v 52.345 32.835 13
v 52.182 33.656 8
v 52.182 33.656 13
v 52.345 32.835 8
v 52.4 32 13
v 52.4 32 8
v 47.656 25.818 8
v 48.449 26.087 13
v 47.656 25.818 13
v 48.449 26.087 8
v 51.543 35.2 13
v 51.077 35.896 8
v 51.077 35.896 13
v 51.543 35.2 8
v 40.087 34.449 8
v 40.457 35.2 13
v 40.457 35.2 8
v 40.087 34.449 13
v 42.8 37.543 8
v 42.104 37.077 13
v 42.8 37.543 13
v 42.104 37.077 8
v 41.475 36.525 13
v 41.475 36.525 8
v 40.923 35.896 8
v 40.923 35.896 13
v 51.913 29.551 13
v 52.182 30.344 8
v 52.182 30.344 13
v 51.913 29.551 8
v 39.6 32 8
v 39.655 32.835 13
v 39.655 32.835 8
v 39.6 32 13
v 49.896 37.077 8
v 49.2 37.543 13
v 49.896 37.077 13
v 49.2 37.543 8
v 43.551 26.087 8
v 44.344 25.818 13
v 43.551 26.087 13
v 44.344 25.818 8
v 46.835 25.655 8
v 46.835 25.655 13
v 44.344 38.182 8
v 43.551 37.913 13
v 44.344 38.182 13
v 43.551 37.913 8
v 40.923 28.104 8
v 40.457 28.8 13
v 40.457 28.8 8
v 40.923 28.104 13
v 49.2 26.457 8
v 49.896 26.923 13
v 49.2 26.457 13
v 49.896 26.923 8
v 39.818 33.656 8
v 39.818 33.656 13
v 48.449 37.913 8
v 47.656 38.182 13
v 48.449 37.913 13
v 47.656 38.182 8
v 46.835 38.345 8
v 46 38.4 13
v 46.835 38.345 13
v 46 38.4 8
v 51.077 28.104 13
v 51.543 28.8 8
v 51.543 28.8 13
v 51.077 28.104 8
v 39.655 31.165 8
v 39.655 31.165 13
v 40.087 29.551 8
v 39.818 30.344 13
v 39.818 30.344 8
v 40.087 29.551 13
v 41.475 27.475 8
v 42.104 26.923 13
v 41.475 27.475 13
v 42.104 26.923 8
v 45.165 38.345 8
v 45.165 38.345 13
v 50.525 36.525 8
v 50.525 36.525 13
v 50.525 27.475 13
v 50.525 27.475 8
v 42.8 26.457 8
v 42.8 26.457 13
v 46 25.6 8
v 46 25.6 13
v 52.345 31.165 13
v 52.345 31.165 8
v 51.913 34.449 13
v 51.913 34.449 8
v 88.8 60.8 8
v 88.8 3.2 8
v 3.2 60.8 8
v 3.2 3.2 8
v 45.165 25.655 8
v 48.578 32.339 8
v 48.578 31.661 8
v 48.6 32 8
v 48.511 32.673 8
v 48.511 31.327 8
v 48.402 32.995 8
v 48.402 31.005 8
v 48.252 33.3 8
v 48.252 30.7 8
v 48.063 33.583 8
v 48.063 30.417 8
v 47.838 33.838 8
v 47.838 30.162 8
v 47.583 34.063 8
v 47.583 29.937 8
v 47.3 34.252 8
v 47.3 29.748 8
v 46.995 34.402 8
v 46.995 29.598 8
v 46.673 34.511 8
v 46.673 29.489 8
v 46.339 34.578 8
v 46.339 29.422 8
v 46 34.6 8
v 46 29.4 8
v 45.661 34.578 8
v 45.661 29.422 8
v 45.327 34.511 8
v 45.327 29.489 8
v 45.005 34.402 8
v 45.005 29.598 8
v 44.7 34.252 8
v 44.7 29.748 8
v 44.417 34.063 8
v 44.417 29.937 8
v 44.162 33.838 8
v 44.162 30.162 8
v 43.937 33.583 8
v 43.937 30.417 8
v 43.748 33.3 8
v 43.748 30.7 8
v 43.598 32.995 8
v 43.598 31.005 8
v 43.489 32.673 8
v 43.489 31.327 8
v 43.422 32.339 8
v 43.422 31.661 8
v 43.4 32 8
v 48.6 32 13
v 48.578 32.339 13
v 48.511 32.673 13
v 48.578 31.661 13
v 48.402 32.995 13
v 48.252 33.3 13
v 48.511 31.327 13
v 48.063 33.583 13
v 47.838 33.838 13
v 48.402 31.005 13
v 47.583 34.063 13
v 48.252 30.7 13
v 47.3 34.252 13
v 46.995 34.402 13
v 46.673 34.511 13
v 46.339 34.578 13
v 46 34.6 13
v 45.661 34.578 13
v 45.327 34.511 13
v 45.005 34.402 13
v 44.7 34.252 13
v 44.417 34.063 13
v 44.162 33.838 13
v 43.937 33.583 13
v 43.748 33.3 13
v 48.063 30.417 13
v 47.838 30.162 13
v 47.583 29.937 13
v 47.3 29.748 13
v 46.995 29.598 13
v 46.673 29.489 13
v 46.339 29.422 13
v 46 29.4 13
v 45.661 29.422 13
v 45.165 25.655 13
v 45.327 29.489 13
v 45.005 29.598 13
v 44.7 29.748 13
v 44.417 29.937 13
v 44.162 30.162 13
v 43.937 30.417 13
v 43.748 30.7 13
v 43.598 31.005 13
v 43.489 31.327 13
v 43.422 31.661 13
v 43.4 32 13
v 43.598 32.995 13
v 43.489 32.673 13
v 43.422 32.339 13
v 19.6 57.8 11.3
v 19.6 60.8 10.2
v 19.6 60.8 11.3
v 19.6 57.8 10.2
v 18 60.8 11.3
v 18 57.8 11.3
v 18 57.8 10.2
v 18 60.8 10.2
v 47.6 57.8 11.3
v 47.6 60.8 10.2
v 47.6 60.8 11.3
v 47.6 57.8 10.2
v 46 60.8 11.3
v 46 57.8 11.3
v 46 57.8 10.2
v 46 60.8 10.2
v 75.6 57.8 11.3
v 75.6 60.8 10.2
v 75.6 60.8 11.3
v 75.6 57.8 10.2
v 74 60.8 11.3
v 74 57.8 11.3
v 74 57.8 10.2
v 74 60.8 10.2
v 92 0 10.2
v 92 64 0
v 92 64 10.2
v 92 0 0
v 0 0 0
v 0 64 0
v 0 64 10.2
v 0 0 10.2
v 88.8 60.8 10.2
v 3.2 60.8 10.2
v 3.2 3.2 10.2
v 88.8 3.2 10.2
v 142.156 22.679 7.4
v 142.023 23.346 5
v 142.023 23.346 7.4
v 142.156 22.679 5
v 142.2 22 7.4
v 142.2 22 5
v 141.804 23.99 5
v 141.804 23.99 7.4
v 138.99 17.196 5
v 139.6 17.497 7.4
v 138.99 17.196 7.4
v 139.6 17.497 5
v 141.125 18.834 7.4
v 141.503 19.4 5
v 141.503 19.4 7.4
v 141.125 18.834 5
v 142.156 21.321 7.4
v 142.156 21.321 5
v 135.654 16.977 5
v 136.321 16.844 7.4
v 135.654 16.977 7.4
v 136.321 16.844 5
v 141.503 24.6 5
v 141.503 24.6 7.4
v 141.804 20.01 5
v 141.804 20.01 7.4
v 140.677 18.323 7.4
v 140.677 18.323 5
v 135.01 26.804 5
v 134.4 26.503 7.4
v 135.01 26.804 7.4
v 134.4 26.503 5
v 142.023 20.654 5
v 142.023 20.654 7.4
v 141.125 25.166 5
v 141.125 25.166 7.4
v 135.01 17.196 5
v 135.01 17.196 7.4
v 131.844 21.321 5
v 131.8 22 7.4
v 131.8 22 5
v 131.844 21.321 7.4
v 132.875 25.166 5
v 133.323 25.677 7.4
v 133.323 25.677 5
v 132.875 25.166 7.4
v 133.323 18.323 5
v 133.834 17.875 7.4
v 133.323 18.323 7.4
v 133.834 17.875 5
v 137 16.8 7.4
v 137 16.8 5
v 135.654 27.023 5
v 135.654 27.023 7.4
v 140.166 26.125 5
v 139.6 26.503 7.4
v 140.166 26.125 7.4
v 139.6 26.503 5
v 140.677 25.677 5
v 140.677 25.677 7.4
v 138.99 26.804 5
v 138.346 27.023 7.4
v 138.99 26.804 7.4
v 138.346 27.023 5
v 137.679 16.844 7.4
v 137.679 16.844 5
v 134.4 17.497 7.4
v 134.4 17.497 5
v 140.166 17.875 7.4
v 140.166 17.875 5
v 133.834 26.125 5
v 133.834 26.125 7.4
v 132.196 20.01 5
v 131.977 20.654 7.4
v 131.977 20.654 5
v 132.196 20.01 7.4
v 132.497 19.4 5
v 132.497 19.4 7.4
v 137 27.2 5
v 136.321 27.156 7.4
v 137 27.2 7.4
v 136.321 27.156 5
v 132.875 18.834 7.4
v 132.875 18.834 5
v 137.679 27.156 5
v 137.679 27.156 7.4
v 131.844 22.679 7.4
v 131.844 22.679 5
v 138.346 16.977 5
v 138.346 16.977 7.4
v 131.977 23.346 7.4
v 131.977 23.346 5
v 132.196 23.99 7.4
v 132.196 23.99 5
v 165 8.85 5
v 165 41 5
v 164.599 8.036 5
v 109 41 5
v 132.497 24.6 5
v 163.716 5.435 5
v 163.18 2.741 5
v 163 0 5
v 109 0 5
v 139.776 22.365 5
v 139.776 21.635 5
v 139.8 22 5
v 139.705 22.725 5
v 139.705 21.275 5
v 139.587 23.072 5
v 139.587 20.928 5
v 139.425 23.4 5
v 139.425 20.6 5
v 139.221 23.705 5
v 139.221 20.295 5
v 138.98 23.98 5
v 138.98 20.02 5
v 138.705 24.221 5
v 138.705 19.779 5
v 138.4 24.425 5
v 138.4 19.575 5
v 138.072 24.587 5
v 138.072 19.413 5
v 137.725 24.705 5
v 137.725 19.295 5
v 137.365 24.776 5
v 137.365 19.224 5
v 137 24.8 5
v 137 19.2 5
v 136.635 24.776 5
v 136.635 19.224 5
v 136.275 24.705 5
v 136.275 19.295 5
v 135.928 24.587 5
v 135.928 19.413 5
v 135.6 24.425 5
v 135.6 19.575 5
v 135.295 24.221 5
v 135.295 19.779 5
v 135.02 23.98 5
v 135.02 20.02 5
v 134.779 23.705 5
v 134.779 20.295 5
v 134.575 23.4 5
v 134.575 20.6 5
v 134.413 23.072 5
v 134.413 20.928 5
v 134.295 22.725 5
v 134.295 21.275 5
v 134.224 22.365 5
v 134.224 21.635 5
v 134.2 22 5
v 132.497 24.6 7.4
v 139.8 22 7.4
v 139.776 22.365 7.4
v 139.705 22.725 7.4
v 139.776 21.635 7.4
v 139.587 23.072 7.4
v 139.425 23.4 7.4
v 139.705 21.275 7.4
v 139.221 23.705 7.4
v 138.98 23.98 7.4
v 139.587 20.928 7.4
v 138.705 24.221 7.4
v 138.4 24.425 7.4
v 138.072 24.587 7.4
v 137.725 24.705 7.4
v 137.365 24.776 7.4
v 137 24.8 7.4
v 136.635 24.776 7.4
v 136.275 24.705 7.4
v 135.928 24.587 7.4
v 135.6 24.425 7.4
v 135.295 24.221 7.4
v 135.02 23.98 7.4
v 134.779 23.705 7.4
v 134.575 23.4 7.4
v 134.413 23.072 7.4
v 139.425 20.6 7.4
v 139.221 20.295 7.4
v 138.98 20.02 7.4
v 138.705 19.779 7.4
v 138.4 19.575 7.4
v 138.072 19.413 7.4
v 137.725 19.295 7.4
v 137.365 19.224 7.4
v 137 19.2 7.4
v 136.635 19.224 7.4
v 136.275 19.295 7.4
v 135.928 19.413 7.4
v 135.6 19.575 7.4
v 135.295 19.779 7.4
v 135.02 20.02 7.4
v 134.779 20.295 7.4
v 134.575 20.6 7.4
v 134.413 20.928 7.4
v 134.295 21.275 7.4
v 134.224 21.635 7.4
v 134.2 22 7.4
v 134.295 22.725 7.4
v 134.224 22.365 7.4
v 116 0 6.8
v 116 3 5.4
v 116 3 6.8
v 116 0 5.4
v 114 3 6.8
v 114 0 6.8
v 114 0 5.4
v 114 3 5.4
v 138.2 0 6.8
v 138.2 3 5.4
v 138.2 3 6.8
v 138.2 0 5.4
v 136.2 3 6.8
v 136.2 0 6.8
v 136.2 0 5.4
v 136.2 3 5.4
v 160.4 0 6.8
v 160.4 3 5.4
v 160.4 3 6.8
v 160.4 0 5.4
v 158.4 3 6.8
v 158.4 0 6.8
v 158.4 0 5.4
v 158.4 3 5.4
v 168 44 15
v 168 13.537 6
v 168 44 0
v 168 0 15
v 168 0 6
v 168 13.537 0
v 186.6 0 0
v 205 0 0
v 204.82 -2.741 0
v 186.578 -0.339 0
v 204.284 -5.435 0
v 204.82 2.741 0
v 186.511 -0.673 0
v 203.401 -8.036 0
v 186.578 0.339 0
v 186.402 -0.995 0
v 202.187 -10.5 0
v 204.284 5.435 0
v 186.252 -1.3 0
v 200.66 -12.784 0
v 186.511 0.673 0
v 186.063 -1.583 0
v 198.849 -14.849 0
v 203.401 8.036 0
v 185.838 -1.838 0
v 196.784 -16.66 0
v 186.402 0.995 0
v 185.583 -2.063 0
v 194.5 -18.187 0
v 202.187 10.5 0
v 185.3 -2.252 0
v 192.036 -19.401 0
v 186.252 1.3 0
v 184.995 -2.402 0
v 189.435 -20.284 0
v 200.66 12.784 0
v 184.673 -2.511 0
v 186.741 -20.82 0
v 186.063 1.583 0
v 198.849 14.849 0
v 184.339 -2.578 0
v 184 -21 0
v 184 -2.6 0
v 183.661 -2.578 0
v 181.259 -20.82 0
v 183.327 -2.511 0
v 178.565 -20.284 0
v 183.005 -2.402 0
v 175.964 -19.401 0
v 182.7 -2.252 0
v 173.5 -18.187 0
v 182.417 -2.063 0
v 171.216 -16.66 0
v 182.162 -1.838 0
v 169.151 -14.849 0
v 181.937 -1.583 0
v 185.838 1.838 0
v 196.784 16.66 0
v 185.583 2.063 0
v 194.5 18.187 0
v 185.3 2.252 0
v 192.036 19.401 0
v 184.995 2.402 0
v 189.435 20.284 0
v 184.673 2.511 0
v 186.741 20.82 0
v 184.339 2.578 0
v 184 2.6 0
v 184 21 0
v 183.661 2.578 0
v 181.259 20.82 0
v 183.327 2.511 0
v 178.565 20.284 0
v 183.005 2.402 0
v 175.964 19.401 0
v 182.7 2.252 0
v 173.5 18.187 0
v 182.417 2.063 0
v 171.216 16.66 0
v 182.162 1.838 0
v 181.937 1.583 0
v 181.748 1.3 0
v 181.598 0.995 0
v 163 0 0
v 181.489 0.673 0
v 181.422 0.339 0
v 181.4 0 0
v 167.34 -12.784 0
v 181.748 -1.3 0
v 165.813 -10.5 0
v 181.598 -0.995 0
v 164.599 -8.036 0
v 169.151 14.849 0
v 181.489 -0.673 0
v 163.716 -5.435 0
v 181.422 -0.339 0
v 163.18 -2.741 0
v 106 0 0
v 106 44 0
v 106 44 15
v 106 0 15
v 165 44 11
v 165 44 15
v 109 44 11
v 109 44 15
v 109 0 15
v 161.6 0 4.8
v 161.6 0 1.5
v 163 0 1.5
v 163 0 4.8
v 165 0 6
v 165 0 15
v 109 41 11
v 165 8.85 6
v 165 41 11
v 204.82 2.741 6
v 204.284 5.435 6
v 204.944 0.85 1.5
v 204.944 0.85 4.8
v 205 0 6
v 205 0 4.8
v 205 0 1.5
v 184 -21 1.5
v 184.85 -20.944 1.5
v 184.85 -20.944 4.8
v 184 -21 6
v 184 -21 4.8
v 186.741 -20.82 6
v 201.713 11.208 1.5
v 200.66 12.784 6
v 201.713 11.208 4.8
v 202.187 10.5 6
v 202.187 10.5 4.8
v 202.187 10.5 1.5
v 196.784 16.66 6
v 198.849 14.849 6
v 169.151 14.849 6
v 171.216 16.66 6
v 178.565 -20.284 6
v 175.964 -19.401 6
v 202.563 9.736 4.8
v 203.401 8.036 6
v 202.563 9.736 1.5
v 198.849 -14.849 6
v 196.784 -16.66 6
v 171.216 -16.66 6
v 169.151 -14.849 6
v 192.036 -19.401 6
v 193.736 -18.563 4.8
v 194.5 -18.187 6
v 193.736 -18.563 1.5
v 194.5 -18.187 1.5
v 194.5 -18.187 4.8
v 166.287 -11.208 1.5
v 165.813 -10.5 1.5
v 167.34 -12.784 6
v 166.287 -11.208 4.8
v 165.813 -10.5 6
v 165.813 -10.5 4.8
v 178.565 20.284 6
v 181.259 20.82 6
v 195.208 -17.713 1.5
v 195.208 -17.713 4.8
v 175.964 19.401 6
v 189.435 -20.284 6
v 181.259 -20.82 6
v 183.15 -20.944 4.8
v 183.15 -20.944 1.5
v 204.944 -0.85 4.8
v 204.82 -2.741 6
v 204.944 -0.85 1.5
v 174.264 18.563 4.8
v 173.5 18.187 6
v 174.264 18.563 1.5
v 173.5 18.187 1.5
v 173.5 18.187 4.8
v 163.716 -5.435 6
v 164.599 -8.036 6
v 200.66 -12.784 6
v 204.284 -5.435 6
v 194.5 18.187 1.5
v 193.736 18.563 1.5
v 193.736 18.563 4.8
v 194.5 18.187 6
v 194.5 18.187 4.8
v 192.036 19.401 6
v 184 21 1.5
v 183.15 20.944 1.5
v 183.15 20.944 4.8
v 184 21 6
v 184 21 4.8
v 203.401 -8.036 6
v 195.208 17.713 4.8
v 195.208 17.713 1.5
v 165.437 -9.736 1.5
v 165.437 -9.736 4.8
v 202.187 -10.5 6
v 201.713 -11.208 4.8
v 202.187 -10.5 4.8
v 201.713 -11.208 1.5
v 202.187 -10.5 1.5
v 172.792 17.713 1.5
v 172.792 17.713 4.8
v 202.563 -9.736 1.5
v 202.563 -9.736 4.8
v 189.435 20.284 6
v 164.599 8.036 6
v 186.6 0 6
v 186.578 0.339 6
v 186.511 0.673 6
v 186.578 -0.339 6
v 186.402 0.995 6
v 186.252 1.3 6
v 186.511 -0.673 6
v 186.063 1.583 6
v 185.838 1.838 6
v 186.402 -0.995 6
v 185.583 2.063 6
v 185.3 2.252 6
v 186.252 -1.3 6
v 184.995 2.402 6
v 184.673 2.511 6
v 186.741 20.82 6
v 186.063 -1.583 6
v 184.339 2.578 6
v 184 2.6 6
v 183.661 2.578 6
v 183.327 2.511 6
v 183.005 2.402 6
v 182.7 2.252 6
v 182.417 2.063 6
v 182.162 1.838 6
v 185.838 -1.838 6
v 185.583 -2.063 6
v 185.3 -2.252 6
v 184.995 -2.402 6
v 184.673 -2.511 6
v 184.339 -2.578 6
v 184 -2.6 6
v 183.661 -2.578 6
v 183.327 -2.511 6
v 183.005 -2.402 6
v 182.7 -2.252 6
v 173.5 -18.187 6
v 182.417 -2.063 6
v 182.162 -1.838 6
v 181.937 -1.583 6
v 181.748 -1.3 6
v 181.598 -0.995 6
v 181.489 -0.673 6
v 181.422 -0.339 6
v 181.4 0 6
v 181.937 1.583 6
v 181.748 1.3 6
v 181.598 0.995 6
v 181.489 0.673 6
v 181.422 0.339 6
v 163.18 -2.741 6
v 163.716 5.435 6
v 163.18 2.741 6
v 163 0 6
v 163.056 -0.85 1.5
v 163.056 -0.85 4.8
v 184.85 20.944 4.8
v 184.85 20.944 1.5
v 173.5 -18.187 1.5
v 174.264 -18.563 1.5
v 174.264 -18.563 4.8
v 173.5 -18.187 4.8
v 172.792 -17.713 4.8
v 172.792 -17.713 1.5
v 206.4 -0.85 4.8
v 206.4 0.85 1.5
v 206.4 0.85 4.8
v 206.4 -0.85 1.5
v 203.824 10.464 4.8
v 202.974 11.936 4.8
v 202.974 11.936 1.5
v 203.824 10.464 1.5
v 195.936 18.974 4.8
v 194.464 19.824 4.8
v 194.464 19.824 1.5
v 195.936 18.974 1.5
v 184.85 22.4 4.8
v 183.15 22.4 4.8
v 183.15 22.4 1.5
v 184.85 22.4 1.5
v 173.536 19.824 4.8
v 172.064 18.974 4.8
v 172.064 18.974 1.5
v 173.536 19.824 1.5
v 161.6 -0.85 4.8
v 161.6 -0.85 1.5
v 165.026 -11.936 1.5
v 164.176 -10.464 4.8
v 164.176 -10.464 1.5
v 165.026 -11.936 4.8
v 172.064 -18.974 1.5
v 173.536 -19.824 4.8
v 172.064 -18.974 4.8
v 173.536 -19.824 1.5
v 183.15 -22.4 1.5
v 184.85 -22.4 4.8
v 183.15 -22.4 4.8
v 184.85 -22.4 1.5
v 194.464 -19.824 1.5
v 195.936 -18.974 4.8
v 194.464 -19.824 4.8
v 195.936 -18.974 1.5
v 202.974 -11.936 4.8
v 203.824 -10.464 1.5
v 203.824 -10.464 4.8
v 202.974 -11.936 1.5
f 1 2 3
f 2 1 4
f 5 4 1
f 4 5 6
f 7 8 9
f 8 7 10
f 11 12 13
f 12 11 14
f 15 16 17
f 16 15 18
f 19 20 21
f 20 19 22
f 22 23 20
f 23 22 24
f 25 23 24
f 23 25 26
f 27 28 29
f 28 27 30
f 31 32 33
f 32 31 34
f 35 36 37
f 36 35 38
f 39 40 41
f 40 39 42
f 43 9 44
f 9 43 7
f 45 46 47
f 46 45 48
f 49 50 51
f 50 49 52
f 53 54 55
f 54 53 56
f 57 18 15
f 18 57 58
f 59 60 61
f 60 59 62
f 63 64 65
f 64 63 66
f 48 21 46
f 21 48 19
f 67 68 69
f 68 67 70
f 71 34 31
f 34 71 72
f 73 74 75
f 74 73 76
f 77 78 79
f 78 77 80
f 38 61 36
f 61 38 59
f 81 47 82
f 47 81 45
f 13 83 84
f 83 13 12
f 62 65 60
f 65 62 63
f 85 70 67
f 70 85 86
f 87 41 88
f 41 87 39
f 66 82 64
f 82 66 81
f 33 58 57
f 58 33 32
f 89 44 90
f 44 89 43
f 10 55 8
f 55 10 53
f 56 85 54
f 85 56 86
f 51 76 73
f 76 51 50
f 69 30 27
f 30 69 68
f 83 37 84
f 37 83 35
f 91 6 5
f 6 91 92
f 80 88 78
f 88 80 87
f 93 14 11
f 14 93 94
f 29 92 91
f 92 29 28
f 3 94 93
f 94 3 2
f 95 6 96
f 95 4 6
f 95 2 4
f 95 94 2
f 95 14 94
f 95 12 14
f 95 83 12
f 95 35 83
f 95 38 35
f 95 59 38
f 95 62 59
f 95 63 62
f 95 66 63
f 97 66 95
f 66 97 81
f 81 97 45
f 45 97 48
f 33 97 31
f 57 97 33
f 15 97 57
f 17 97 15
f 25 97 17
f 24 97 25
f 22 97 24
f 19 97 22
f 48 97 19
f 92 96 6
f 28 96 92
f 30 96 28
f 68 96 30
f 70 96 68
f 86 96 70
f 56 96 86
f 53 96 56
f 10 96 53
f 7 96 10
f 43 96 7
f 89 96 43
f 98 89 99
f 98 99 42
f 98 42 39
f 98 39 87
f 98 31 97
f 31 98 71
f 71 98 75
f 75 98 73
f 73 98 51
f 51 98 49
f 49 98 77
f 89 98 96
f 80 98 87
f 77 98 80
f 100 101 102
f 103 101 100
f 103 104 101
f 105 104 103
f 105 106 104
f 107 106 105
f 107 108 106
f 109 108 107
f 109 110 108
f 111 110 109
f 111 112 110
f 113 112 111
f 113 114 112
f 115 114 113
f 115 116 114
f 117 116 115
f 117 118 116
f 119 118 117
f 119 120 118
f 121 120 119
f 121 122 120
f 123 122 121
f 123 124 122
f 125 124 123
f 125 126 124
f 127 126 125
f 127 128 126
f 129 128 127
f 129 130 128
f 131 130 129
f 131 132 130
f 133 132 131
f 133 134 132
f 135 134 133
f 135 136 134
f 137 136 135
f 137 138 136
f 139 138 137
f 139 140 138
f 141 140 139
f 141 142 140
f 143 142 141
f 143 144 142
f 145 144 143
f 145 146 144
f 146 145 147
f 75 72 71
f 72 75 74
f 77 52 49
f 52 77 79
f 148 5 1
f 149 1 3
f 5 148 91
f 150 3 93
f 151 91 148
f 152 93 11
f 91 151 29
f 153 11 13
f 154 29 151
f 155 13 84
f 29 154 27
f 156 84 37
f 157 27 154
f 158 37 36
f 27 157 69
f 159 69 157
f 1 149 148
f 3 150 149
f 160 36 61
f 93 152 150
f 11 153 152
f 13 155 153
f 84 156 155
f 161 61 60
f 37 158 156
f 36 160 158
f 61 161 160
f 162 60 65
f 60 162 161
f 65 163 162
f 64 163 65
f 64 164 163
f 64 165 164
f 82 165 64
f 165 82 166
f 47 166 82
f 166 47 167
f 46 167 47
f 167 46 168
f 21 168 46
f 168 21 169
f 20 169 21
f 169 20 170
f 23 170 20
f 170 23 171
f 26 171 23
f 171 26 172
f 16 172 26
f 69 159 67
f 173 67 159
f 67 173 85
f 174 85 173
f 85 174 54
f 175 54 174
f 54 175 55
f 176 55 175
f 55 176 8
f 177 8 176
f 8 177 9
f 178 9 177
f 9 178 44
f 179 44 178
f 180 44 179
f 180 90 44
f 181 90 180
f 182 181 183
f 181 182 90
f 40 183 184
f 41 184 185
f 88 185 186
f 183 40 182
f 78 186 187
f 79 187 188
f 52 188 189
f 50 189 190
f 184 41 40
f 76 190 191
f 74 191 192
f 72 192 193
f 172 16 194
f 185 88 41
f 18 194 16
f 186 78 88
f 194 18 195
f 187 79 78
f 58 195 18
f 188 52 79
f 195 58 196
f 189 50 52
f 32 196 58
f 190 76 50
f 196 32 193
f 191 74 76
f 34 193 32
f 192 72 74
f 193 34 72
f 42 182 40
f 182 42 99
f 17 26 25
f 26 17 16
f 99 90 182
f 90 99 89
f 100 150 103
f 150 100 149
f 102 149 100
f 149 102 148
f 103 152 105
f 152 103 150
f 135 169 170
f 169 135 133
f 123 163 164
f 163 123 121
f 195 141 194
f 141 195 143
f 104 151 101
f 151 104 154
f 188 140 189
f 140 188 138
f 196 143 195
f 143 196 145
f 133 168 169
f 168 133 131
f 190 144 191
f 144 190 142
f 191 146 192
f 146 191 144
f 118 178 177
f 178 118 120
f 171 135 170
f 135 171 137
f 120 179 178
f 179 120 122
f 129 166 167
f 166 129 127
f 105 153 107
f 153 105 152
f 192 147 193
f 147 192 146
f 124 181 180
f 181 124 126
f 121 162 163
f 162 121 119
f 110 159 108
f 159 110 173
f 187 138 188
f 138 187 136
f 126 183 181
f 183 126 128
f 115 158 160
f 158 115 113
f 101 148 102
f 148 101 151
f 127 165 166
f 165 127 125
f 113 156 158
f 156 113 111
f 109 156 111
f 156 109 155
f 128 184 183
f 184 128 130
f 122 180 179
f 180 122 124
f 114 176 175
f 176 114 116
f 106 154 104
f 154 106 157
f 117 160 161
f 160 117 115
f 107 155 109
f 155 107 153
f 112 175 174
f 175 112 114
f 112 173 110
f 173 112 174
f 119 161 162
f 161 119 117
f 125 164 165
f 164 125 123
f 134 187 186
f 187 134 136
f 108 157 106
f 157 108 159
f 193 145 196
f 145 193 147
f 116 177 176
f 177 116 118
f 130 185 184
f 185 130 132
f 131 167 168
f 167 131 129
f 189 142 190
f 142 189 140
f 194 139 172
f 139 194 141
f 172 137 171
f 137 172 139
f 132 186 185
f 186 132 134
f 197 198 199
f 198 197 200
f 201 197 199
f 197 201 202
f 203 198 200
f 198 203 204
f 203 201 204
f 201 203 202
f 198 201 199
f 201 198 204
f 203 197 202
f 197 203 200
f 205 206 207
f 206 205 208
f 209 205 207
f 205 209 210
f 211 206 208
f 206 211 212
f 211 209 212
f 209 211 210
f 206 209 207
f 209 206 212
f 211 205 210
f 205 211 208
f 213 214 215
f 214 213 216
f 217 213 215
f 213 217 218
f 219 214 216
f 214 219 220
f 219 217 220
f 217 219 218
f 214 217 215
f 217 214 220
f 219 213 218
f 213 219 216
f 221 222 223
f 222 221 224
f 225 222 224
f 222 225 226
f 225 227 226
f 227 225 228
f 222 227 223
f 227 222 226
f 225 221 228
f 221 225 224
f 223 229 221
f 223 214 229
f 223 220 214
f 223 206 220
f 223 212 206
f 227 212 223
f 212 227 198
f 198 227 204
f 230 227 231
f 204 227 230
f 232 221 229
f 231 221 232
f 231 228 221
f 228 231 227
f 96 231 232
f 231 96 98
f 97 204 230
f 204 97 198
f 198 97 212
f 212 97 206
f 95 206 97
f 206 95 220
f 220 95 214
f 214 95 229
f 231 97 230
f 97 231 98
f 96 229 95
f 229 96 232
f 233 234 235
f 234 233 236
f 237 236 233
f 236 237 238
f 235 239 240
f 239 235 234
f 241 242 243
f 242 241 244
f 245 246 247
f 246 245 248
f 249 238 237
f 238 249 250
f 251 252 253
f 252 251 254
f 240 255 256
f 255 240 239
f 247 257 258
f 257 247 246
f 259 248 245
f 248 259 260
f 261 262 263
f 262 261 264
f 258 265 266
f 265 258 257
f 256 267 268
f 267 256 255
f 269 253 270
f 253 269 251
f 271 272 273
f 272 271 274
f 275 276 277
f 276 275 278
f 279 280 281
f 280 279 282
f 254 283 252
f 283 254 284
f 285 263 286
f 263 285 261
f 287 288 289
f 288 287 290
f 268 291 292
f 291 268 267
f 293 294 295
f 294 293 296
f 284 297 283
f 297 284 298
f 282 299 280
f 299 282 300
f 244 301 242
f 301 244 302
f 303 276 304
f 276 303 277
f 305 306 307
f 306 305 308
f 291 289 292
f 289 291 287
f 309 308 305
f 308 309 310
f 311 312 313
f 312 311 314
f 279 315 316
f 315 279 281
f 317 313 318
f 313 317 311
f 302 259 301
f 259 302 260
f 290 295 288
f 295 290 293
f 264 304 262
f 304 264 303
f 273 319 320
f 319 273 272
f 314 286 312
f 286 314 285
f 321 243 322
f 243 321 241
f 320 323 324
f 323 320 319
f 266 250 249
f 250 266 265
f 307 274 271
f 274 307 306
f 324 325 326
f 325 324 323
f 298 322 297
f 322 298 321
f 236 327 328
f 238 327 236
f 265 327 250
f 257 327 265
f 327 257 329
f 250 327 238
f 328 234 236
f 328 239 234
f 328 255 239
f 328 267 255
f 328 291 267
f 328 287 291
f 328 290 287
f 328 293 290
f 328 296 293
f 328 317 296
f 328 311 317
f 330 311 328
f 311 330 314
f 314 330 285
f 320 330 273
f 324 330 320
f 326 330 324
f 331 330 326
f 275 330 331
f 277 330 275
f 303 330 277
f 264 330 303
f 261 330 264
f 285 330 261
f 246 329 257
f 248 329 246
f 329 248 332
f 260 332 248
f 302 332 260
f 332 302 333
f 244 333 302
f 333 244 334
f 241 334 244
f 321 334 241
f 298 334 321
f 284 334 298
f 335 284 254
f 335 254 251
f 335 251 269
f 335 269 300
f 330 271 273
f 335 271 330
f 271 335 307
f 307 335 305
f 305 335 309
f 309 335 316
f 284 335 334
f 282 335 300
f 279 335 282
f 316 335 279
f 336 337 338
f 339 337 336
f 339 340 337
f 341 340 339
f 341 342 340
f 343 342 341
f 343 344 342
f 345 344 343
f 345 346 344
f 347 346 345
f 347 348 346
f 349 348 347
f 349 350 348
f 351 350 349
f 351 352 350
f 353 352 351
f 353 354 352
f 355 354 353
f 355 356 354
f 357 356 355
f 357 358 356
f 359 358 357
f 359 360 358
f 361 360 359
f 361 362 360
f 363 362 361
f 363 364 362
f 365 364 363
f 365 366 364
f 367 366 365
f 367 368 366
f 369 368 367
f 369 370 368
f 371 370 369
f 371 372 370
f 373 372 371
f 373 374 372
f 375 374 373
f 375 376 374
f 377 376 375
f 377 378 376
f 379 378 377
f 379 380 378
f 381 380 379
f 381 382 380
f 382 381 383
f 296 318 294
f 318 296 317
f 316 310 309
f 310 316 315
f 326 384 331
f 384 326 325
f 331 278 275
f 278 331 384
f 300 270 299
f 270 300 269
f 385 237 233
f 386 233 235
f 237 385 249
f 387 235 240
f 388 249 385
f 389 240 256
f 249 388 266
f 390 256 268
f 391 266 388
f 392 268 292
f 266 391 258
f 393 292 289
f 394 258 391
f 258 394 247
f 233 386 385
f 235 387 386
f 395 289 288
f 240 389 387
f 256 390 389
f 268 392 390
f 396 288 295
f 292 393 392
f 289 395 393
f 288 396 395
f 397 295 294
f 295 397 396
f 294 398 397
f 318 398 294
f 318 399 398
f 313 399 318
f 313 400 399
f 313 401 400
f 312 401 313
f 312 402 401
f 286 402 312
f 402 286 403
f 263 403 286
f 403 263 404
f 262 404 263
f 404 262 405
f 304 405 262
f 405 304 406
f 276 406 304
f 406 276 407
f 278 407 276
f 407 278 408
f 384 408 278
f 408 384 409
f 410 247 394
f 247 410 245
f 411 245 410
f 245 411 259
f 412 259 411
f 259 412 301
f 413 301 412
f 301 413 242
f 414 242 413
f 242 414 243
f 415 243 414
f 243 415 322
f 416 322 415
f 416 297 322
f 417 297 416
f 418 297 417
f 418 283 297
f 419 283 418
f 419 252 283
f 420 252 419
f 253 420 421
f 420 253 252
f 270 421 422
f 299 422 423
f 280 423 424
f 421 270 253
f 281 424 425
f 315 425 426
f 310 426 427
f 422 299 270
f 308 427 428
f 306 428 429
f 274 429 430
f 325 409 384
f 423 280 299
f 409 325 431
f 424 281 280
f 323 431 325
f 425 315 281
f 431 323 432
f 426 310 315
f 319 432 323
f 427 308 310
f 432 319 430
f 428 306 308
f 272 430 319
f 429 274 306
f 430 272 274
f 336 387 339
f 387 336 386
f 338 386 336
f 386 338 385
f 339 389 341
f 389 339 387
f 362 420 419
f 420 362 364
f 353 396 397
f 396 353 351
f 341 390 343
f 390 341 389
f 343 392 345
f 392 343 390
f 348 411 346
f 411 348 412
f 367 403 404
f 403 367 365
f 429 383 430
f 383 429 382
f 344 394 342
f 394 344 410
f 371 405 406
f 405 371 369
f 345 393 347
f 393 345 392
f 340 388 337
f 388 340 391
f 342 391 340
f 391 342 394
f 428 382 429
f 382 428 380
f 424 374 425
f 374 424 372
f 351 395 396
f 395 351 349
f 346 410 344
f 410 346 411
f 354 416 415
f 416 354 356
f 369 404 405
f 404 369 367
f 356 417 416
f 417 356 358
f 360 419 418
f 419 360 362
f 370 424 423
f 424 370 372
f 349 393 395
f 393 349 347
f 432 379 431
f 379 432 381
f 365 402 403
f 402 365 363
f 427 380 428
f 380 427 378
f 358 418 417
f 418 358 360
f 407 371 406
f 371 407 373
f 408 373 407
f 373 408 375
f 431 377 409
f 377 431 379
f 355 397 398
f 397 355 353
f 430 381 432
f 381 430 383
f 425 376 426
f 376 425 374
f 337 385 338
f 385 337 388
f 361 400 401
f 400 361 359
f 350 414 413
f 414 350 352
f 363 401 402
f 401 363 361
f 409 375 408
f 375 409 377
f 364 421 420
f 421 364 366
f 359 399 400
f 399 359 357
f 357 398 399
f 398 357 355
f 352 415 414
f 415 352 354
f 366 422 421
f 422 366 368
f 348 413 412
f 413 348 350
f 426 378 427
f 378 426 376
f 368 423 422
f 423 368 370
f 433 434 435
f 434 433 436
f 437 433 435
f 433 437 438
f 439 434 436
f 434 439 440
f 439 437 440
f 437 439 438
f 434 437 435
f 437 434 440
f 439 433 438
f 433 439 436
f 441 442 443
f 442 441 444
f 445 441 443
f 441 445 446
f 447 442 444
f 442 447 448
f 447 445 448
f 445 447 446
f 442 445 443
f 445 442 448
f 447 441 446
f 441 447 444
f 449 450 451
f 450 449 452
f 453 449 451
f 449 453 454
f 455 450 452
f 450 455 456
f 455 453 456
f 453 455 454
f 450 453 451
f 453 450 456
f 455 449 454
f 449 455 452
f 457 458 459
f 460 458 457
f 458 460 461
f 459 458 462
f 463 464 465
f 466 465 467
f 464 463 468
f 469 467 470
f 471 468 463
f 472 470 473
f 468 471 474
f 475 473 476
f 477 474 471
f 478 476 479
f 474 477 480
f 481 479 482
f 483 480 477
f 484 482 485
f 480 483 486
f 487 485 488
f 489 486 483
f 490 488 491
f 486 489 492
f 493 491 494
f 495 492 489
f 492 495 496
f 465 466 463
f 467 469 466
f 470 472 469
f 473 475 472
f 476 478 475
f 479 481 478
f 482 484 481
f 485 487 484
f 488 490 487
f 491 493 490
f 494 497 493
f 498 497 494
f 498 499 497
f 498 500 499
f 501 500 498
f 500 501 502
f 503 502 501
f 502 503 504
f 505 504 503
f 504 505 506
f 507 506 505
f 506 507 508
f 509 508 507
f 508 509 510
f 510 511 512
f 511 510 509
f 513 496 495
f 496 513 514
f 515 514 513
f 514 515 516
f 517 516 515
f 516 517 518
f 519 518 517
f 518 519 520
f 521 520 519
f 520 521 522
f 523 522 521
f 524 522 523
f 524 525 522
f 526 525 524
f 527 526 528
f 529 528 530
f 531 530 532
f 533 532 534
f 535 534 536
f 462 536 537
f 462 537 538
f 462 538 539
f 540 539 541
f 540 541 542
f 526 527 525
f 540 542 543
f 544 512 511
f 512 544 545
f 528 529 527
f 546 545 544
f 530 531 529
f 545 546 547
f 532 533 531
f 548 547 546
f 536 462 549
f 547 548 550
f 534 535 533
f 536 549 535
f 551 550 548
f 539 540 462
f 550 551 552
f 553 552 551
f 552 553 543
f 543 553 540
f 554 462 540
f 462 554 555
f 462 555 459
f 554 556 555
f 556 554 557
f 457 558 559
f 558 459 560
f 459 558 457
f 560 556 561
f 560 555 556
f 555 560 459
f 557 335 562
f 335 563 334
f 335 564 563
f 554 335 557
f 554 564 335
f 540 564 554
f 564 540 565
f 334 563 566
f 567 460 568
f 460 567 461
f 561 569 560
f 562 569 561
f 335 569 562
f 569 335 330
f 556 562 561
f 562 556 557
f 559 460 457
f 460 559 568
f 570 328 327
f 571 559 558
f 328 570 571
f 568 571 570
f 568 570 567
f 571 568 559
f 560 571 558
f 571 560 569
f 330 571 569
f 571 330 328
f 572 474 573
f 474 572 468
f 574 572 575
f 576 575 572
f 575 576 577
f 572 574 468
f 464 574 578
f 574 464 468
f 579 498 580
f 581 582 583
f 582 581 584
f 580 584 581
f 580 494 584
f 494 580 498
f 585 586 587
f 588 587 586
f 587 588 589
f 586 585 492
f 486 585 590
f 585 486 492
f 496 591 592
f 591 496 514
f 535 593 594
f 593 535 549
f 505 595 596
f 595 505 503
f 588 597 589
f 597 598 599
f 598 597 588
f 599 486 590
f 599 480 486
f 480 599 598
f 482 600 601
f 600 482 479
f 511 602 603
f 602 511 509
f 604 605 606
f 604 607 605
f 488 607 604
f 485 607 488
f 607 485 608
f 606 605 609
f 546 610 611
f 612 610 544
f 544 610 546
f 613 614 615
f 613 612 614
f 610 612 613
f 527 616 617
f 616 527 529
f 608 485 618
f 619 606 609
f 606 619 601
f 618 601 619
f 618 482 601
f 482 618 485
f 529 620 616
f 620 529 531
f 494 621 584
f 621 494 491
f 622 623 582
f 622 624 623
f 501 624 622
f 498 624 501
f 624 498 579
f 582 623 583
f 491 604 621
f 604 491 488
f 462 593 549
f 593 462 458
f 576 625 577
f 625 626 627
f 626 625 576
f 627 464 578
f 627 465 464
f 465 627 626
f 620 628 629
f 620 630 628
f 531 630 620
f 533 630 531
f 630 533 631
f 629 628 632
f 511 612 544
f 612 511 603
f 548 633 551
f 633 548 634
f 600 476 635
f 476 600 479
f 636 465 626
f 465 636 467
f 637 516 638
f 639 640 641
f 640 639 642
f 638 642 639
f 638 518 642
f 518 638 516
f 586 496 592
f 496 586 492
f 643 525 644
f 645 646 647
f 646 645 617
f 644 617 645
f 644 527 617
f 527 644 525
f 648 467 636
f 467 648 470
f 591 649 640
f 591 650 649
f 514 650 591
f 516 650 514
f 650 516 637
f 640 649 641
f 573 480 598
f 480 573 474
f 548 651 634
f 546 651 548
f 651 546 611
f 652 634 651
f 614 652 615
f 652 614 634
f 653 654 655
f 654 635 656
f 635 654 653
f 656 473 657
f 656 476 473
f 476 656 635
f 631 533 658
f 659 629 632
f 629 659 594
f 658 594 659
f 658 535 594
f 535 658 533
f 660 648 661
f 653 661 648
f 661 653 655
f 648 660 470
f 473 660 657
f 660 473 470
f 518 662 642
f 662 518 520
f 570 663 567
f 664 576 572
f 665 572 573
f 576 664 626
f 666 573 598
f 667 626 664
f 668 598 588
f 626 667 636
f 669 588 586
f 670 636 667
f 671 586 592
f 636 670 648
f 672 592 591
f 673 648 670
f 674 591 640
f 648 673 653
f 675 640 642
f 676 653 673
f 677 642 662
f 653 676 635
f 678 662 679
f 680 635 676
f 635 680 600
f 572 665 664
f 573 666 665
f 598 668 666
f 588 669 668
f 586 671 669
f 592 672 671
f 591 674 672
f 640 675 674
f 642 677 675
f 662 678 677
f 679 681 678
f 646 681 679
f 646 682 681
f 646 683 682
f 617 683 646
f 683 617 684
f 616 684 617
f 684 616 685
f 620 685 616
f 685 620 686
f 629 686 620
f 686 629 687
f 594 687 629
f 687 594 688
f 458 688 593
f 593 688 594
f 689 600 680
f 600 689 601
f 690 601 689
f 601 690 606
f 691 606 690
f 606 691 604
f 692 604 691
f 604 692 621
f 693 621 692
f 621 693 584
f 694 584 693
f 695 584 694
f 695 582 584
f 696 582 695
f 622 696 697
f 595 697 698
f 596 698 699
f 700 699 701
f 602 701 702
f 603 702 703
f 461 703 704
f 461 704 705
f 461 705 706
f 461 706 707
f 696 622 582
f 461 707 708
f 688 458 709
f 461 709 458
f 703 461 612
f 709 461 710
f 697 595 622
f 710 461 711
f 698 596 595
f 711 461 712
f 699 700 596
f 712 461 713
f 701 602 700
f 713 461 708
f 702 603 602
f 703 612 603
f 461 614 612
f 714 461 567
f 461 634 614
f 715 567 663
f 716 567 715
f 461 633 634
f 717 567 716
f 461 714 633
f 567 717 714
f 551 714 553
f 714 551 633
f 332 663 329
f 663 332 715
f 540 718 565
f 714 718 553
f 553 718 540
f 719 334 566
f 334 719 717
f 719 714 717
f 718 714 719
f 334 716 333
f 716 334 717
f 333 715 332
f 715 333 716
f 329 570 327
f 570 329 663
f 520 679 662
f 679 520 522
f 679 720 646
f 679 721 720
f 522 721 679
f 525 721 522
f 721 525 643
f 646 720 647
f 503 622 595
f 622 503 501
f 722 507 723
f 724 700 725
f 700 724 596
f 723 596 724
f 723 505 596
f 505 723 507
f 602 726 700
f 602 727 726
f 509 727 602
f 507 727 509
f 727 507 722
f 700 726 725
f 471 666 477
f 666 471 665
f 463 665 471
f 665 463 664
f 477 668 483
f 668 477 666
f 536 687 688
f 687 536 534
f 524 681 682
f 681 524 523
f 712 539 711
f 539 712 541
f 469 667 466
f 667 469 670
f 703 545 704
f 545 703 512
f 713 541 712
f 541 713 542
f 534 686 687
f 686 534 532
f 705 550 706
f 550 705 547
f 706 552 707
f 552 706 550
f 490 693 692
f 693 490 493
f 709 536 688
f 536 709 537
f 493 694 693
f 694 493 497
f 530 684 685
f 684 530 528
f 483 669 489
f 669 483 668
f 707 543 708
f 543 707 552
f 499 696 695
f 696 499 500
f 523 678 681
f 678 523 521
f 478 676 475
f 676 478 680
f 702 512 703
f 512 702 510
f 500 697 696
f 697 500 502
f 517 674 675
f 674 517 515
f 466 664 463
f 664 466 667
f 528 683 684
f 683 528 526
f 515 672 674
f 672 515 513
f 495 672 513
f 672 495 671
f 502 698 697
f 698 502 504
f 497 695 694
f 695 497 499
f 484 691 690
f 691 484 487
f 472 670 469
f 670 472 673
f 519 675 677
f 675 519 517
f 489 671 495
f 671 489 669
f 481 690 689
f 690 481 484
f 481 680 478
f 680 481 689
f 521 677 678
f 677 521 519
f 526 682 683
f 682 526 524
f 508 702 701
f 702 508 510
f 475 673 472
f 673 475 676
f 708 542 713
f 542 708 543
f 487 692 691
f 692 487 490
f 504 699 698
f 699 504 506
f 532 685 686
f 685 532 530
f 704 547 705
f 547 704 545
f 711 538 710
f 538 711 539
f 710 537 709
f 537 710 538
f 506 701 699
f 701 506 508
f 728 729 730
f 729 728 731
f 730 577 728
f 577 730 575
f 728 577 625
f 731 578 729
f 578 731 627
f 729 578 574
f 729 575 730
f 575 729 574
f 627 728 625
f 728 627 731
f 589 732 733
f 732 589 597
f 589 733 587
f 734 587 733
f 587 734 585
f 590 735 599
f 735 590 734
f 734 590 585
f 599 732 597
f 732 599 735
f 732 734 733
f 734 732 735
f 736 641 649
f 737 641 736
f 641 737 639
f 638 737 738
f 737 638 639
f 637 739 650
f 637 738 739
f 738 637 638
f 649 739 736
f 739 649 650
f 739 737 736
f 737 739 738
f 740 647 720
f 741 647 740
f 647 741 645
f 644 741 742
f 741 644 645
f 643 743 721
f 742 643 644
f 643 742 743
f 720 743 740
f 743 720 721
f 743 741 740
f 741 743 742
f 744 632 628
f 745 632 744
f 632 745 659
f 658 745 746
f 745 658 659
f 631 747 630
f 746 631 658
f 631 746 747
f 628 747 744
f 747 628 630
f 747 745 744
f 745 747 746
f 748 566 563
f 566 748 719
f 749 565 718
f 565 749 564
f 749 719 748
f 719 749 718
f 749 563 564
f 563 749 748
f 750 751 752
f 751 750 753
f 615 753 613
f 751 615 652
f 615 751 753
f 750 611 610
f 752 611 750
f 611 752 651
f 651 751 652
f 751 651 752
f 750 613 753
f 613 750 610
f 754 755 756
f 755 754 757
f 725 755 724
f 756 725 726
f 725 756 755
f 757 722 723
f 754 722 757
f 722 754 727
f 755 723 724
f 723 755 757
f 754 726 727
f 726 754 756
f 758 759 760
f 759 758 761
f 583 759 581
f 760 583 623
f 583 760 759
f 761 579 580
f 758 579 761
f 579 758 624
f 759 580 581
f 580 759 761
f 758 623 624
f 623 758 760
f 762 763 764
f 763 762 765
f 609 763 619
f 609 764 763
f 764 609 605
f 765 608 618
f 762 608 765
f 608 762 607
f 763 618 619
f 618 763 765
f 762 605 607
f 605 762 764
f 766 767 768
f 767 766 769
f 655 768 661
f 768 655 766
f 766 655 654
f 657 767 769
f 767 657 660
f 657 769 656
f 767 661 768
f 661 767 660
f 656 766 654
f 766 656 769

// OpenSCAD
// HelicalDesk: Parametric 3-Stage Snap-Fit Instrument Stand & Rotary Detent Pod
// OpenSCAD source for Hack Club Half Life Week 2 and Hack Club Atlantis.
//
// All dimensions are in millimetres. Every parameter below is exposed to the
// OpenSCAD Customizer (Design > Customizer in OpenSCAD 2021.01 or newer) via
// the bracketed annotations. The same numeric set is mirrored in
// tools/generate_suite_artifacts.js so that the checked-in STL and OBJ files
// are deterministic reproductions of this model.
//
// Print settings: PLA, 0.2 mm layer height, 3 perimeters, 15% infill, no
// supports needed. Snap tabs are oriented to print flat on the build plate.
// Allow 0.2 mm clearance on the hinge bore for an M2.5 screw.

/* [Chassis] */
chassis_w = 92;        // [60:140] Overall chassis width
chassis_d = 64;        // [40:100] Overall chassis depth
chassis_h = 8;         // [4:16] Base plate thickness
rim = 3.2;             // [2:6] Raised perimeter rim width
rim_h = 2.2;           // [1:5] Raised perimeter rim height
boss_r = 6.4;          // [4:12] Central rotary boss outer radius
boss_bore = 2.6;       // [2:4] M2.5 clearance bore radius
boss_h = 5.0;          // [2:10] Boss height above base plate

/* [Tilt cradle] */
cradle_w = 62;         // [40:90] Instrument cradle width
cradle_d = 44;         // [30:70] Instrument cradle depth
cradle_h = 5;          // [3:10] Cradle floor thickness
cheek_w = 3.0;         // [2:6] Side cheek wall thickness
cheek_h = 10;          // [5:20] Side cheek height
rear_lip_h = 6;        // [3:12] Rear stop lip height
hinge_r = 5.2;         // [3:9] Cradle hinge boss radius

/* [Detent dial] */
dial_r = 21;           // [12:35] Dial outer radius
dial_h = 6;            // [3:12] Dial thickness
dial_bore = 2.6;       // [2:4] Dial bore radius
detents = 12;          // [6:24] Number of radial detent teeth
tooth_in = 0.9;        // [0.4:2] Tooth radial inset
tooth_out = 1.4;       // [0.5:3] Tooth radial protrusion
tooth_half = 0.85;     // [0.4:2] Tooth half width

/* [Snap fit] */
snap_len = 3.0;        // [1.5:6] Latch tab length
snap_w = 1.6;          // [0.8:3] Latch tab width
snap_h = 1.1;          // [0.5:2] Latch tab height
snap_count = 3;        // [2:5] Number of latch tabs
clearance = 0.2;       // [0.1:0.5] Print clearance on mating bores

/* [Assembly] */
cradle_dx = 15;        // [0:30] Cradle X offset in assembled preview
cradle_dy = 10;        // [0:25] Cradle Y offset in assembled preview
cradle_dz = 12;        // [0:25] Cradle Z offset in assembled preview
dial_dz = 15;          // [0:25] Dial Z offset in assembled preview
$fn = 48;              // [16:96] Circle tessellation segments

module ring(r_out, r_in, h) {
  difference() {
    cylinder(h = h, r = r_out);
    translate([0, 0, -1])
      cylinder(h = h + 2, r = r_in);
  }
}

module base_chassis() {
  // Solid base plate.
  cube([chassis_w, chassis_d, chassis_h]);
  // Raised perimeter rim built as four bars so the center stays open.
  translate([0, 0, chassis_h])
    cube([chassis_w, rim, rim_h]);
  translate([0, chassis_d - rim, chassis_h])
    cube([chassis_w, rim, rim_h]);
  translate([0, rim, chassis_h])
    cube([rim, chassis_d - 2 * rim, rim_h]);
  translate([chassis_w - rim, rim, chassis_h])
    cube([rim, chassis_d - 2 * rim, rim_h]);
  // Rotary boss with an M2.5 through bore.
  translate([chassis_w / 2, chassis_d / 2, chassis_h])
    ring(boss_r, boss_bore, boss_h);
  // Rear snap-fit latch tabs, evenly spaced along the rear rim.
  for (i = [0 : snap_count - 1]) {
    x = 18 + i * ((chassis_w - 36) / max(1, snap_count - 1));
    translate([x, chassis_d - rim - snap_len, chassis_h + rim_h])
      cube([snap_w, snap_len, snap_h]);
  }
}

module tilt_cradle() {
  cube([cradle_w, cradle_d, cradle_h]);
  // Side cheeks hold the instrument at a fixed angle.
  translate([0, 0, cradle_h])
    cube([cheek_w, cradle_d, cheek_h]);
  translate([cradle_w - cheek_w, 0, cradle_h])
    cube([cheek_w, cradle_d, cheek_h]);
  // Rear stop lip.
  translate([0, cradle_d - 3, cradle_h])
    cube([cradle_w, 3, rear_lip_h]);
  // Hinge boss that mates with the chassis rotary boss.
  translate([cradle_w / 2, cradle_d / 2, cradle_h])
    ring(hinge_r, boss_bore + clearance, 2.4);
  // Front snap receivers spaced to match the chassis latch tabs.
  for (i = [0 : snap_count - 1]) {
    x = 8 + i * ((cradle_w - 16 - snap_w) / max(1, snap_count - 1));
    translate([x, 0, cradle_h + 0.4])
      cube([snap_w + 0.4, snap_len, 1.4]);
  }
}

module detent_dial() {
  ring(dial_r, dial_bore, dial_h);
  // Radial detent teeth. Each tooth is a rotated closed box so the result is
  // a single manifold solid without a boolean union.
  for (i = [0 : detents - 1]) {
    a = 360 * i / detents;
    rotate([0, 0, a])
      translate([dial_r - tooth_in, -tooth_half, dial_h * 0.25])
        cube([tooth_in + tooth_out, 2 * tooth_half, dial_h * 0.55]);
  }
}

// Render one part at a time by commenting out the other two calls, or use the
// assembled_preview module to see all three stages stacked for a screenshot.
module assembled_preview() {
  base_chassis();
  translate([cradle_dx, cradle_dy, cradle_dz]) tilt_cradle();
  translate([chassis_w / 2, chassis_d / 2, dial_dz]) detent_dial();
}

// Default render: all three printable parts laid out side by side.
translate([0, 0, 0]) base_chassis();
translate([chassis_w + 14, 0, 0]) tilt_cradle();
translate([chassis_w + cradle_w + 30, 0, 0]) detent_dial();
